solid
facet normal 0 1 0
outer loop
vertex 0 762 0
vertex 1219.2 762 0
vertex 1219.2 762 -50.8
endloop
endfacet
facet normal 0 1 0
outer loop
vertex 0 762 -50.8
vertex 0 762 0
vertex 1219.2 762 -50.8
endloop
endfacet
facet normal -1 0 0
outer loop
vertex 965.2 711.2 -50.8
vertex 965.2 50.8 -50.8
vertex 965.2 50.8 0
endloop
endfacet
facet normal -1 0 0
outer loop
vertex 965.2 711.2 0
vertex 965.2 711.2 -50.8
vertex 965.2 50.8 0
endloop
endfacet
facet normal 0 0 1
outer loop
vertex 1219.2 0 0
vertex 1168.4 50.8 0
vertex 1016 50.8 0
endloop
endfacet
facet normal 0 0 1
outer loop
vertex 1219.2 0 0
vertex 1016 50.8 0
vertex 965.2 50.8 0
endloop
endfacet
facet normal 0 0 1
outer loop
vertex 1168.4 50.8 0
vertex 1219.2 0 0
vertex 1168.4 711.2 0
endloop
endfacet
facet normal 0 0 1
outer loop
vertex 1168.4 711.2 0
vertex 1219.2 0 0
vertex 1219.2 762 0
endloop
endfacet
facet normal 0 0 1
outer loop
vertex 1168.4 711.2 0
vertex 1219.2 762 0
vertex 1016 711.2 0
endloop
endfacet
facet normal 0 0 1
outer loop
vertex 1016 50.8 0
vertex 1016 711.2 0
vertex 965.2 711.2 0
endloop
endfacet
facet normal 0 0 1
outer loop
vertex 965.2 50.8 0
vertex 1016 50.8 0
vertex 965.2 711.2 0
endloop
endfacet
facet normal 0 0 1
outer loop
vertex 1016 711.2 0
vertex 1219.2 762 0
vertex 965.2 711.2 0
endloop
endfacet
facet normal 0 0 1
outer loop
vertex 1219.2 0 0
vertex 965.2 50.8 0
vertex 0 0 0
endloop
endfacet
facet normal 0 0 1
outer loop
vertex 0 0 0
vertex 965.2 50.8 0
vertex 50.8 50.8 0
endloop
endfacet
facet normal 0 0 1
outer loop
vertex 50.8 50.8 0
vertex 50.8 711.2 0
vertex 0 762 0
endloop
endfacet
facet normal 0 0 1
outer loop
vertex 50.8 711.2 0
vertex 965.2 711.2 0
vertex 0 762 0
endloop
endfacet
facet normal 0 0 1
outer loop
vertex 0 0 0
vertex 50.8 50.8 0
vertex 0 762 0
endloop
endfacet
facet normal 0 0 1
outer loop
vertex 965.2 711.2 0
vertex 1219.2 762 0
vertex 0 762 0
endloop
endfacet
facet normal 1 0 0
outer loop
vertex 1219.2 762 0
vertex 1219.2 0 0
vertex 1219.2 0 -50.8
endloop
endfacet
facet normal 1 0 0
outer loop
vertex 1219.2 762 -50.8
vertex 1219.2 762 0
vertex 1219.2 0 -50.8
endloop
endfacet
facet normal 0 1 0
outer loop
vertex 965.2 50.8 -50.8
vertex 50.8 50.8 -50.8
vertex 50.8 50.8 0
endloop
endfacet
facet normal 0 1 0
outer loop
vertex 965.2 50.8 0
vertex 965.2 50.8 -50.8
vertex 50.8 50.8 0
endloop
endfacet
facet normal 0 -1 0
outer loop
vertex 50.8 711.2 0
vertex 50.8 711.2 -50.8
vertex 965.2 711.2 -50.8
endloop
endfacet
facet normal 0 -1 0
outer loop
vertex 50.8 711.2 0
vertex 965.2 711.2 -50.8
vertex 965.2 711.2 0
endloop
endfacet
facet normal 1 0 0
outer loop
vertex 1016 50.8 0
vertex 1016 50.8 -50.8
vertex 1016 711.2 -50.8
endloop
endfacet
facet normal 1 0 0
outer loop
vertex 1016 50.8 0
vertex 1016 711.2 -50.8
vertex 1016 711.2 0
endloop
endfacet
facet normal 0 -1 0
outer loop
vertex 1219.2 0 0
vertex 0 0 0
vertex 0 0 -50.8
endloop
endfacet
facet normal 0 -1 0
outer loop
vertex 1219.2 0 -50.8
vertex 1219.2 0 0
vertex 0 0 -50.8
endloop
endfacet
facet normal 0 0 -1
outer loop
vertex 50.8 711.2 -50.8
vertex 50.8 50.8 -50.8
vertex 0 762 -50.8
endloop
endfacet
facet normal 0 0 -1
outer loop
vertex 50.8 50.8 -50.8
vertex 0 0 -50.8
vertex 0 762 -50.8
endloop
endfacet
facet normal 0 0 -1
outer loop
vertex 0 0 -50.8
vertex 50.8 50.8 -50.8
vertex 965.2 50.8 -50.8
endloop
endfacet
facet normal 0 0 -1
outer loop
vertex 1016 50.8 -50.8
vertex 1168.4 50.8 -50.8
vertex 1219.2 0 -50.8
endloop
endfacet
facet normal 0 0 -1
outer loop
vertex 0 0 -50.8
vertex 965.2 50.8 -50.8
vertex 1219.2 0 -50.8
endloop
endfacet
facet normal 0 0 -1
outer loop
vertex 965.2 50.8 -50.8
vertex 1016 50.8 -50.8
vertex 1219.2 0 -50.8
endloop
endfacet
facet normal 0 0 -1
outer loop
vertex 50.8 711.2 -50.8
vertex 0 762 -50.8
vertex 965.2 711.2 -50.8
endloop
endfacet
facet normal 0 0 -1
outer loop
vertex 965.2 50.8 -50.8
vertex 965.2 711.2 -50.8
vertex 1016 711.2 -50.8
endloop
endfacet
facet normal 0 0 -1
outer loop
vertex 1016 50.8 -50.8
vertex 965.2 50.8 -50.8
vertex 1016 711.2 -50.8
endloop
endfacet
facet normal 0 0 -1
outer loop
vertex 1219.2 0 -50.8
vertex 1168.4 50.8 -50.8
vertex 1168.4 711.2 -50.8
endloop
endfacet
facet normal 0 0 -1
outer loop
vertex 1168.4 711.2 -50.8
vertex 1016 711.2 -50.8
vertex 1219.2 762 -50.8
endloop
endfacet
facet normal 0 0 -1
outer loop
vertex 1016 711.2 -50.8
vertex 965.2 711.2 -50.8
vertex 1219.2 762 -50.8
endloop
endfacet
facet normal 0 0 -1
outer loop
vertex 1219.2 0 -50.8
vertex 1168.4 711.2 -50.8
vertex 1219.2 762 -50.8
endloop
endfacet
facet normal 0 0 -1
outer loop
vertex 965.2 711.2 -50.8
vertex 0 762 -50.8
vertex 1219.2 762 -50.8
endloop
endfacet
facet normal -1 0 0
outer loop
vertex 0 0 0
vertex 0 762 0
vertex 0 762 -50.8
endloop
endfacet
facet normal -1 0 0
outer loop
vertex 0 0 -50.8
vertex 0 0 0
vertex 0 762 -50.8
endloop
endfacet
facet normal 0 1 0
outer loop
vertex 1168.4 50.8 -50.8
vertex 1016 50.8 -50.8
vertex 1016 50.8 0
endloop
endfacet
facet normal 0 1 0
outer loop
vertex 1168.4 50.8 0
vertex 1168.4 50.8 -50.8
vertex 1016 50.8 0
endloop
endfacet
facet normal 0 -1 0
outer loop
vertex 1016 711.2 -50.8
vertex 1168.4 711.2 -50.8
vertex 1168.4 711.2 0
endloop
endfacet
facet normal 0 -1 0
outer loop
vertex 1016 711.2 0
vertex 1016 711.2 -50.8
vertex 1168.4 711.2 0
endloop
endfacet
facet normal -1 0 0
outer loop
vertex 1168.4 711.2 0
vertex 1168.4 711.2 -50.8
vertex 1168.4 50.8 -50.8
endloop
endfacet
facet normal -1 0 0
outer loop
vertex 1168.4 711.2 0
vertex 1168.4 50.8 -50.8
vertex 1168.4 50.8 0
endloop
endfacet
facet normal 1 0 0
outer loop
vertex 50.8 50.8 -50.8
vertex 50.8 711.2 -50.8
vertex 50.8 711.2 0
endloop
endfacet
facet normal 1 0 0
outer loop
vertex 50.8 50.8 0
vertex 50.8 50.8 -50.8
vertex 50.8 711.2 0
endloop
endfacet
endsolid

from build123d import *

# Parameters (mm, degrees)
F1_W     = 50.8
F1_H     = 50.8
F3_W     = 50.8
F3_H     = 50.8
F4_DEPTH = 660.4


with BuildPart() as f2:
    # F2: sweep along a path in F0
    with BuildLine(Plane.XY) as f2_path:
        Line((0, 0), (0, 762))
        Line((0, 762), (1219.2, 762))
        Line((1219.2, 762), (1219.2, 0))
        Line((1219.2, 0), (0, 0))
    # F1 (on Front) → F2 (sweep)
    with BuildSketch(Plane.XZ):
        with Locations((25.4, -25.4)):
            Rectangle(F1_W, F1_H)
    sweep(path=f2_path.line, transition=Transition.RIGHT)

    # F3 (on face) → F4 (join, through all)
    with BuildSketch(Plane.XZ.offset(-711.2)):
        with Locations((990.6, -25.4)):
            Rectangle(F3_W, F3_H)
    extrude(amount=F4_DEPTH)


solid = f2.part
